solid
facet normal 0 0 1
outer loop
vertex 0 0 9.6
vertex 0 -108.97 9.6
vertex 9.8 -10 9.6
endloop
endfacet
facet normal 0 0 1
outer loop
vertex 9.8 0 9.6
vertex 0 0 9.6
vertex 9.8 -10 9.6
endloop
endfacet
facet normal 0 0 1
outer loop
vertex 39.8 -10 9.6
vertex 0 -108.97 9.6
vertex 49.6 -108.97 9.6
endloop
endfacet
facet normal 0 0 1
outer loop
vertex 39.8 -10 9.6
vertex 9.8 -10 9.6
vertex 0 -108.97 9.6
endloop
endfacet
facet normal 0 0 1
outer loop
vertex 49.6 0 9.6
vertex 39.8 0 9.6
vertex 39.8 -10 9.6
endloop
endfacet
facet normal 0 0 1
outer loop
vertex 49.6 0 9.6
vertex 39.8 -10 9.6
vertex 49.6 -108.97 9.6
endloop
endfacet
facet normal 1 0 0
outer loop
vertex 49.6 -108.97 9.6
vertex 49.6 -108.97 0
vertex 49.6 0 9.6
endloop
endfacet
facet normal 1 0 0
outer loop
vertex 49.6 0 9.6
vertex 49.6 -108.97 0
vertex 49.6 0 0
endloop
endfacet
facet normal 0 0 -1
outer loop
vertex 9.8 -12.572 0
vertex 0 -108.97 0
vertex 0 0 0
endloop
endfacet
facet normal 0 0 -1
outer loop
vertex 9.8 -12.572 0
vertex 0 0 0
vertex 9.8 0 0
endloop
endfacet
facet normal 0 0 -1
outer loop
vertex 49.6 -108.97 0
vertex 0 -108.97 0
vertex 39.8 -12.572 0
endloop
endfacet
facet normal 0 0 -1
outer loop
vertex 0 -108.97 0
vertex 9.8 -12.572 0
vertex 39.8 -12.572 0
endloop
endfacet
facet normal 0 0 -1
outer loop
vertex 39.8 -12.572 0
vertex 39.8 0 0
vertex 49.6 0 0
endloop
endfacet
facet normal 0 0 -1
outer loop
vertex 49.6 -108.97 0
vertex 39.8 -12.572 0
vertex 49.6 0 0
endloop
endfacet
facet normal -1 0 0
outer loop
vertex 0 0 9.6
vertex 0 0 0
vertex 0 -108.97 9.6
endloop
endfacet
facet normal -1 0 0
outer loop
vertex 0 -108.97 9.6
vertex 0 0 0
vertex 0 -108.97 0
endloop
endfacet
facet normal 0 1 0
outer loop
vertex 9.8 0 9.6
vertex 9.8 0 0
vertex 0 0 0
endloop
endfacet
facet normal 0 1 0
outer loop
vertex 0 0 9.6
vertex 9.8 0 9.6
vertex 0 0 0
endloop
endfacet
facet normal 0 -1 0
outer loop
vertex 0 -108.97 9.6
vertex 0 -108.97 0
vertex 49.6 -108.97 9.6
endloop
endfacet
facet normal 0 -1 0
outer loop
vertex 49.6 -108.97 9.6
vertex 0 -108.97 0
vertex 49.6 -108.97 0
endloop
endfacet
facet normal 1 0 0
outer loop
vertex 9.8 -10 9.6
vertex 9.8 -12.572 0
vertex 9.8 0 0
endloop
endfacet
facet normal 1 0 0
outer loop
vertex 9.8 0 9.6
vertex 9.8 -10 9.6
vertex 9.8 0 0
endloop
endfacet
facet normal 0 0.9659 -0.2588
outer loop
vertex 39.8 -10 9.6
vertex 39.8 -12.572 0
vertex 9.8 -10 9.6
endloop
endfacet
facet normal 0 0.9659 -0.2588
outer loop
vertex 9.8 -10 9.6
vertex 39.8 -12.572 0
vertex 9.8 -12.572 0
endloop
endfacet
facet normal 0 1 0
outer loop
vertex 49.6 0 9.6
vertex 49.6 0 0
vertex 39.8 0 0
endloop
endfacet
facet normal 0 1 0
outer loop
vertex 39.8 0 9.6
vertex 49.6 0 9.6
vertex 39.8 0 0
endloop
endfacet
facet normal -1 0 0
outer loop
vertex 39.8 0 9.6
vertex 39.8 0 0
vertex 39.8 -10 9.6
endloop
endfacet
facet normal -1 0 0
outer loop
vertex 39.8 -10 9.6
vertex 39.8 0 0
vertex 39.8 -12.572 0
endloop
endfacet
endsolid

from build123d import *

# Parameters (mm, degrees)
EXTRUDE_1_DEPTH = 9.6
DRAFT_5_ANGLE   = -15


with BuildPart() as part:
    # 草图1 → 凸台-拉伸1 (new body)
    with BuildSketch(Plane.XY):
        Polygon((9.8, 0), (0, 0), (0, -108.97), (49.6, -108.97), (49.6, 0), (39.8, 0), (39.8, -10), (9.8, -10), align=None)
    extrude(amount=EXTRUDE_1_DEPTH)

    # 拔模5
    draft_5_faces = [part.faces().sort_by_distance(p)[0] for p in [
        (24.8, -10, 4.8),
    ]]
    draft(draft_5_faces, Plane.XY.offset(9.6), DRAFT_5_ANGLE)


solid = part.part
